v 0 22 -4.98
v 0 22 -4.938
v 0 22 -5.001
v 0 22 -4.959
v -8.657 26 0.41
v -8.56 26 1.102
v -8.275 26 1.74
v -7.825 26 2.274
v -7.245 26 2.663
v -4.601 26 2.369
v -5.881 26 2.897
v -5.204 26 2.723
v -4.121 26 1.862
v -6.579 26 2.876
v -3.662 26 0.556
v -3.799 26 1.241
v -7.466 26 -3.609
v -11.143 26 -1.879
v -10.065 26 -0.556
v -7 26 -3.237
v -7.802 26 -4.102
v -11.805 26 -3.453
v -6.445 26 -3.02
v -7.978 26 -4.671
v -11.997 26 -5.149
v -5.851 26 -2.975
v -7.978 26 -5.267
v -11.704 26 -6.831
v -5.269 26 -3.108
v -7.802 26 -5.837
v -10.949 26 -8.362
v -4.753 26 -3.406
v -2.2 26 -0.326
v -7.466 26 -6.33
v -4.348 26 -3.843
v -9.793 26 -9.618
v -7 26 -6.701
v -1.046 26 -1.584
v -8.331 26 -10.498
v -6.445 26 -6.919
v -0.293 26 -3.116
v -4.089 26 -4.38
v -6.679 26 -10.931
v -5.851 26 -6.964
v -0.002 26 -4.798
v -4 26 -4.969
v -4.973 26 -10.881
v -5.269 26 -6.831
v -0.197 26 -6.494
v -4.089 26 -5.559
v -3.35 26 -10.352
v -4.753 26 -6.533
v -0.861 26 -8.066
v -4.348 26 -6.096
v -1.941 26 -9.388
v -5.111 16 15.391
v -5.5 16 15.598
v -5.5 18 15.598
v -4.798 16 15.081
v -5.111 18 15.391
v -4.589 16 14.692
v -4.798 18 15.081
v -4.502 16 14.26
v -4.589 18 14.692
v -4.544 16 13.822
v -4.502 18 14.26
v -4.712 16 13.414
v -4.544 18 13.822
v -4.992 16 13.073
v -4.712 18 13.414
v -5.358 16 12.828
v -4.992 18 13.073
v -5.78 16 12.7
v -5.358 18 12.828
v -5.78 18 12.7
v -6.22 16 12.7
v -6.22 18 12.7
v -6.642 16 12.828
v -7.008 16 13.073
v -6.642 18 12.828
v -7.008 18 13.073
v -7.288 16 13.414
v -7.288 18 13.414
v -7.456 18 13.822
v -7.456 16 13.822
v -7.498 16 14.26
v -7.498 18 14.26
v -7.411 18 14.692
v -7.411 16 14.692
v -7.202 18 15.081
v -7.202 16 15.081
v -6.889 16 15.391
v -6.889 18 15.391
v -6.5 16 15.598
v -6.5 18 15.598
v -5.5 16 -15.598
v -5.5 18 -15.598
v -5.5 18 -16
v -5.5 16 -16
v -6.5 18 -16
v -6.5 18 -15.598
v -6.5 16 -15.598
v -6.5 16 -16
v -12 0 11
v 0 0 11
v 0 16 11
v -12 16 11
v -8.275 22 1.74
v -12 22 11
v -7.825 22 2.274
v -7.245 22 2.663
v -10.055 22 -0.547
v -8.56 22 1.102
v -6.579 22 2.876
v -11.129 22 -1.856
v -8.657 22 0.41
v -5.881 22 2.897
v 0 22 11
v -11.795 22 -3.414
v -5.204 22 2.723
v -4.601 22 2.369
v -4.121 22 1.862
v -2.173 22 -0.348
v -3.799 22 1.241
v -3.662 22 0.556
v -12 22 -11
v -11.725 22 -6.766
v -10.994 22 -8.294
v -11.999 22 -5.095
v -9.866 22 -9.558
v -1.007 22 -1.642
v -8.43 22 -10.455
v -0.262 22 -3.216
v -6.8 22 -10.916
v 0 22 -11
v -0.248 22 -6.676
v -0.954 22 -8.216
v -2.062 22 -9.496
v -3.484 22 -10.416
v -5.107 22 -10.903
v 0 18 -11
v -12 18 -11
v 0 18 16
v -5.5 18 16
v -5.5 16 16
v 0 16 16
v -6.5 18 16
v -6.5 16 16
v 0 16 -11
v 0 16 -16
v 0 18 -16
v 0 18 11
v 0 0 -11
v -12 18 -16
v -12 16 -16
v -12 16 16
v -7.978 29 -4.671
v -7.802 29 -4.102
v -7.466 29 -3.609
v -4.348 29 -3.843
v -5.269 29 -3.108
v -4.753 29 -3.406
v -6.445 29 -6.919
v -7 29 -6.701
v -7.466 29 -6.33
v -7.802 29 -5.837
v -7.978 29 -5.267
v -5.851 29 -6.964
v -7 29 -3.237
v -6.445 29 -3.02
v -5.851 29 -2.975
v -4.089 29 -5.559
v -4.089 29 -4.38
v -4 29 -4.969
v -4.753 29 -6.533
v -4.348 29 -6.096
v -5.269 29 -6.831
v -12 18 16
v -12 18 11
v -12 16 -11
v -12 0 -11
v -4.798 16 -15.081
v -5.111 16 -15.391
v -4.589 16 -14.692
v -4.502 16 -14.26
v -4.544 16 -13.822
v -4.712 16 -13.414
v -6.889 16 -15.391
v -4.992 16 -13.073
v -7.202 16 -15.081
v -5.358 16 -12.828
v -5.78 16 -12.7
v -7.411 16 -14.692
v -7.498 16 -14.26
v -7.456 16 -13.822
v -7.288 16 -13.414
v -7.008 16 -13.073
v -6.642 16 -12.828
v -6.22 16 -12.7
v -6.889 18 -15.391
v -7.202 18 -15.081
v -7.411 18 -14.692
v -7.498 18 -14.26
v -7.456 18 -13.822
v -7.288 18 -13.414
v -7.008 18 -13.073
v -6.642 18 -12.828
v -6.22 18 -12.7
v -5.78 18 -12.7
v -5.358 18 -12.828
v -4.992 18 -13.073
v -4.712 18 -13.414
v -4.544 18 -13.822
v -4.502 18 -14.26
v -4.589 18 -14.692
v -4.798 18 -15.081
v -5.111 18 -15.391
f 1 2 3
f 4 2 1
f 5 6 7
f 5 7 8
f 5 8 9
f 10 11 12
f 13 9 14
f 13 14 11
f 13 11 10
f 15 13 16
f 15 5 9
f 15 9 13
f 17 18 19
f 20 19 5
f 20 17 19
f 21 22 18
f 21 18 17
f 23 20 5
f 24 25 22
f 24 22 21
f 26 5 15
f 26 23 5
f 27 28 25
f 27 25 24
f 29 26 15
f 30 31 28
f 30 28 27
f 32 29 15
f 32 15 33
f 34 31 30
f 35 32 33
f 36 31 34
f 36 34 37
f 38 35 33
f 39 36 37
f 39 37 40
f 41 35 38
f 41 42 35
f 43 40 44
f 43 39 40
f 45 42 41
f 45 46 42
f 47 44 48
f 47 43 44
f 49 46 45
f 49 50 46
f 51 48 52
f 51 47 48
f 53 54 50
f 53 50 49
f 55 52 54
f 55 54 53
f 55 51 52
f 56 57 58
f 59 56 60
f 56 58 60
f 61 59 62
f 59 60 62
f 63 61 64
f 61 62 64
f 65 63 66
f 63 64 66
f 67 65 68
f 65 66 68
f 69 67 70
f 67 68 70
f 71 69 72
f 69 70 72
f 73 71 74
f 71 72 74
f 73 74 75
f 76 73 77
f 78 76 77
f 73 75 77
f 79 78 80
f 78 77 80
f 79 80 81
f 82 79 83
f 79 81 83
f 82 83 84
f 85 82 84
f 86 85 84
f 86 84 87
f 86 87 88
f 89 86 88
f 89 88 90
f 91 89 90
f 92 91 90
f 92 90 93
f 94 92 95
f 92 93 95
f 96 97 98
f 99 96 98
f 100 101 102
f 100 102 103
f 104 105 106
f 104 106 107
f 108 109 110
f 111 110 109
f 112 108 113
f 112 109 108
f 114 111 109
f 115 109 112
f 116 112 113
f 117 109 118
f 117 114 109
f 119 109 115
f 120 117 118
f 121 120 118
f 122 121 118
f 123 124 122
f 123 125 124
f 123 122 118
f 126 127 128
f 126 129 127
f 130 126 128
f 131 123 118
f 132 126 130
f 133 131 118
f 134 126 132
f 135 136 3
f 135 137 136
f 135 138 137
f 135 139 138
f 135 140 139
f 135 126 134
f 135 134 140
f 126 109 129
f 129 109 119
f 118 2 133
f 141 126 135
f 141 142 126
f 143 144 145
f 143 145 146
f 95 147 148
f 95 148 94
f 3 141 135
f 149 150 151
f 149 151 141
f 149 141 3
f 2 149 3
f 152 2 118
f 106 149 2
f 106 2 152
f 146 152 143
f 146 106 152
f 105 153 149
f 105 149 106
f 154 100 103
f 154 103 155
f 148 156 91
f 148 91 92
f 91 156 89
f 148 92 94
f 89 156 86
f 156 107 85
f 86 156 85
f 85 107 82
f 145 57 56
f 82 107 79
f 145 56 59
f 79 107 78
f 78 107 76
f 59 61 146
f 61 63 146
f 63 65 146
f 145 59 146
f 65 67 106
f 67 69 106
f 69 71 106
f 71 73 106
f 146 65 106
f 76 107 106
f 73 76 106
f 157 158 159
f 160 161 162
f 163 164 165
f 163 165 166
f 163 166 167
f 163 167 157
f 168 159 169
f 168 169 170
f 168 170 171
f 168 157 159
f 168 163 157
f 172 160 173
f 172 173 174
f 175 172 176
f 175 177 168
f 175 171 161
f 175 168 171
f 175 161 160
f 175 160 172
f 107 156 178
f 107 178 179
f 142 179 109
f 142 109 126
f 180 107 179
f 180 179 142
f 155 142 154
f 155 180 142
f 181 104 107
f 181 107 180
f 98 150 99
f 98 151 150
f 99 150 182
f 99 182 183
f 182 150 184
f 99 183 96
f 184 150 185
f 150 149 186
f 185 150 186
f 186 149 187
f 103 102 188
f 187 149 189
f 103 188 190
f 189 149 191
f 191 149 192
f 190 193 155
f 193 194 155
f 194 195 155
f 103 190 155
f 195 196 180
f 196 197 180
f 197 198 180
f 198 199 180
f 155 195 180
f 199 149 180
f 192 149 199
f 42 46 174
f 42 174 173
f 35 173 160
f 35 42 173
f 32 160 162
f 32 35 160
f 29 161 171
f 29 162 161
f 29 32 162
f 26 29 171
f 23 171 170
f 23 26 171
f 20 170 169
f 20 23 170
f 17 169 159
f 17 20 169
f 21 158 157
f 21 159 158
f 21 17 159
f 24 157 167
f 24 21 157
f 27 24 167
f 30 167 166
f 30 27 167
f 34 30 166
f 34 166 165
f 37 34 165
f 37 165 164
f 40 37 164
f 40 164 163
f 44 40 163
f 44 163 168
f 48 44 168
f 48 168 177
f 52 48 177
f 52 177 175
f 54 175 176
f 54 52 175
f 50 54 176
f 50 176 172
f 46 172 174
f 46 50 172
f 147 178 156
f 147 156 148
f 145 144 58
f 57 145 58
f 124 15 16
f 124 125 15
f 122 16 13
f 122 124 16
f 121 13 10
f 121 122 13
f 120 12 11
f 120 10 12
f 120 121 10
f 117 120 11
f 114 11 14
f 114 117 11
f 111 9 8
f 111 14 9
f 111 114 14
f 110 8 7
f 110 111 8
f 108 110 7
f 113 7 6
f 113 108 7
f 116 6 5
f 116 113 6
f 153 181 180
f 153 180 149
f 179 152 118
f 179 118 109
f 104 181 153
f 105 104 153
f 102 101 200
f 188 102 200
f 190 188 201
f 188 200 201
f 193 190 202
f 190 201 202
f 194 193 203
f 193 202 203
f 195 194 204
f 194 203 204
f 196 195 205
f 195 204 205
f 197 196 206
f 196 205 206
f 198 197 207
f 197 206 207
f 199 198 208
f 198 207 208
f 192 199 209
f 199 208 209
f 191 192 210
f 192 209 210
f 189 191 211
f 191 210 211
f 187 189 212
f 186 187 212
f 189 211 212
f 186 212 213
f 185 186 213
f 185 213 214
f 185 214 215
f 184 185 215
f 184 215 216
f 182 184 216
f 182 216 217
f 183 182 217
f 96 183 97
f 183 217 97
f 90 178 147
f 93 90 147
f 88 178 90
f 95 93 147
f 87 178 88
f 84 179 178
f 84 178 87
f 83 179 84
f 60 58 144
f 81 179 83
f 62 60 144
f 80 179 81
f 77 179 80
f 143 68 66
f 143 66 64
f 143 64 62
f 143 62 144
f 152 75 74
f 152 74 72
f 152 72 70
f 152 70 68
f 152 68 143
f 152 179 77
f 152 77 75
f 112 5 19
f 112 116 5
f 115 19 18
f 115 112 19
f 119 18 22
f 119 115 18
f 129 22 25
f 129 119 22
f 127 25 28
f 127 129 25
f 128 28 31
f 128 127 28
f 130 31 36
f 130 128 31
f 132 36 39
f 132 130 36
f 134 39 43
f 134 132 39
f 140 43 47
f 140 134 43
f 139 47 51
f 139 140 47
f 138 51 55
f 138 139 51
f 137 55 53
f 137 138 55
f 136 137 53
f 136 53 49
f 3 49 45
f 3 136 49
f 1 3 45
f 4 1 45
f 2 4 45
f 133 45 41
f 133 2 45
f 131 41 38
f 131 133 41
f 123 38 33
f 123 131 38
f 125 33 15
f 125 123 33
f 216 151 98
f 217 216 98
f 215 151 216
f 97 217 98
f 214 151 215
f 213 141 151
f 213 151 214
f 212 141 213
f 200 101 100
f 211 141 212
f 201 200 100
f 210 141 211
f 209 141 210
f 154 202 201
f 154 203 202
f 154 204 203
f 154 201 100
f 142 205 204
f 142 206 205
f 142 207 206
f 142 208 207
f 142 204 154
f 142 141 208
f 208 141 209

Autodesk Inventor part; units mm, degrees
ref_plane "YZ Plane" through (0, 0, 0) normal (1, 0, 0) x (0, 1, 0)
ref_plane "XZ Plane" through (0, 0, 0) normal (0, 1, 0) x (-1, 0, 0)
ref_plane "XY Plane" through (0, 0, 0) normal (0, 0, 1) x (1, 0, 0)
sketch "Boceto1" plane through (0, 0, 0) normal (0, 1, 0) x (-1, 0, 0)
  line L0 (0, 0) -> (12, 0)
  line L1 (12, 0) -> (12, -11)
  line L2 (12, -11) -> (0, -11)
  line L3 (0, -11) -> (0, 0)
extrude "Extrusión1" add sketch "Boceto1" along normal blind 22
sketch "Boceto2" plane through (0, 0, -11) normal (0, 0, -1) x (-1, 0, 0)
  line L0 (12, 22) -> (0, 22) projected
  line L1 (0, 18) -> (12, 18)
  line L2 (0, 16) -> (12, 16)
  line L3 (12, 0) -> (12, 22) projected
  line L4 (0, 18) -> (0, 16)
  line L5 (0, 0) -> (0, 22) projected
  line L6 (12, 18) -> (12, 16)
extrude "Extrusión2" add sketch "Boceto2" along normal blind 5 contours L3 L2 L4 L1
sketch "Boceto3" plane through (-12, 18, -11) normal (0, 1, 0) x (1, 0, 0)
  line L0 (0, 5) -> (12, 5) projected
  arc A0 (5.5, 4.5976) -> (6.5, 4.5976) centre (6, 3.1834) ccw
  line L1 (5.5, 4.5976) -> (5.5, 5)
  line L2 (5.5, 5) -> (6.5, 5)
  line L3 (6.5, 4.5976) -> (6.5, 5)
  point P0 (12, -11)
extrude "Extrusión3" cut sketch "Boceto3" against normal through all
mirror "Simetría1" about plane through (-12, 0, 0) normal (0, 0, 1) of "Extrusión1", "Extrusión2", "Extrusión3"
sketch "Boceto5" plane through (0, 22, 0) normal (0, 1, 0) x (1, 0, 0)
  line L0 (0, 11) -> (-12, 11) projected
  arc A0 (-3.6616, -0.5562) -> (-8.6574, -0.41) centre (-6, 4.9694) ccw
  arc A1 (-8.6574, -0.41) -> (-3.6616, -0.5562) centre (-6.1574, -0.412) ccw
  point P0 (0, 0)
extrude "Extrusión4" add sketch "Boceto5" along normal blind 4
sketch "Boceto6" plane through (0, 26, 0) normal (0, 1, 0) x (1, 0, 0)
  line L0 (0, 11) -> (0, 4.9694) projected
  arc A0 (0, 4.9694) -> (-12, 4.9694) centre (-6, 4.9694) ccw projected
  circle A1 centre (-6, 4.9694) radius 2
  point P0 (0, 0)
extrude "Extrusión5" add sketch "Boceto6" along normal blind 3
equation "\"Radio_pliegue\" = Grosor"
equation "\"Anchura_desahogo_plegado\" = Grosor"
equation "\"Profundidad_desahogo_plegado\" = 0.5 * Grosor"
equation "\"Tamaño_destalonado\" = 4 * Grosor"
equation "\"Remanente_mínimo\" = 2 * Grosor"
equation "\"Radiodetransición\" = Radio_pliegue"
equation "\"Tamaño_de_radio_de_Jacobi\" = Radio_pliegue"
equation "\"TamañoSeparación\" = Grosor"
equation "\"Grosor\" = 0.5"
properties part number "servo"
